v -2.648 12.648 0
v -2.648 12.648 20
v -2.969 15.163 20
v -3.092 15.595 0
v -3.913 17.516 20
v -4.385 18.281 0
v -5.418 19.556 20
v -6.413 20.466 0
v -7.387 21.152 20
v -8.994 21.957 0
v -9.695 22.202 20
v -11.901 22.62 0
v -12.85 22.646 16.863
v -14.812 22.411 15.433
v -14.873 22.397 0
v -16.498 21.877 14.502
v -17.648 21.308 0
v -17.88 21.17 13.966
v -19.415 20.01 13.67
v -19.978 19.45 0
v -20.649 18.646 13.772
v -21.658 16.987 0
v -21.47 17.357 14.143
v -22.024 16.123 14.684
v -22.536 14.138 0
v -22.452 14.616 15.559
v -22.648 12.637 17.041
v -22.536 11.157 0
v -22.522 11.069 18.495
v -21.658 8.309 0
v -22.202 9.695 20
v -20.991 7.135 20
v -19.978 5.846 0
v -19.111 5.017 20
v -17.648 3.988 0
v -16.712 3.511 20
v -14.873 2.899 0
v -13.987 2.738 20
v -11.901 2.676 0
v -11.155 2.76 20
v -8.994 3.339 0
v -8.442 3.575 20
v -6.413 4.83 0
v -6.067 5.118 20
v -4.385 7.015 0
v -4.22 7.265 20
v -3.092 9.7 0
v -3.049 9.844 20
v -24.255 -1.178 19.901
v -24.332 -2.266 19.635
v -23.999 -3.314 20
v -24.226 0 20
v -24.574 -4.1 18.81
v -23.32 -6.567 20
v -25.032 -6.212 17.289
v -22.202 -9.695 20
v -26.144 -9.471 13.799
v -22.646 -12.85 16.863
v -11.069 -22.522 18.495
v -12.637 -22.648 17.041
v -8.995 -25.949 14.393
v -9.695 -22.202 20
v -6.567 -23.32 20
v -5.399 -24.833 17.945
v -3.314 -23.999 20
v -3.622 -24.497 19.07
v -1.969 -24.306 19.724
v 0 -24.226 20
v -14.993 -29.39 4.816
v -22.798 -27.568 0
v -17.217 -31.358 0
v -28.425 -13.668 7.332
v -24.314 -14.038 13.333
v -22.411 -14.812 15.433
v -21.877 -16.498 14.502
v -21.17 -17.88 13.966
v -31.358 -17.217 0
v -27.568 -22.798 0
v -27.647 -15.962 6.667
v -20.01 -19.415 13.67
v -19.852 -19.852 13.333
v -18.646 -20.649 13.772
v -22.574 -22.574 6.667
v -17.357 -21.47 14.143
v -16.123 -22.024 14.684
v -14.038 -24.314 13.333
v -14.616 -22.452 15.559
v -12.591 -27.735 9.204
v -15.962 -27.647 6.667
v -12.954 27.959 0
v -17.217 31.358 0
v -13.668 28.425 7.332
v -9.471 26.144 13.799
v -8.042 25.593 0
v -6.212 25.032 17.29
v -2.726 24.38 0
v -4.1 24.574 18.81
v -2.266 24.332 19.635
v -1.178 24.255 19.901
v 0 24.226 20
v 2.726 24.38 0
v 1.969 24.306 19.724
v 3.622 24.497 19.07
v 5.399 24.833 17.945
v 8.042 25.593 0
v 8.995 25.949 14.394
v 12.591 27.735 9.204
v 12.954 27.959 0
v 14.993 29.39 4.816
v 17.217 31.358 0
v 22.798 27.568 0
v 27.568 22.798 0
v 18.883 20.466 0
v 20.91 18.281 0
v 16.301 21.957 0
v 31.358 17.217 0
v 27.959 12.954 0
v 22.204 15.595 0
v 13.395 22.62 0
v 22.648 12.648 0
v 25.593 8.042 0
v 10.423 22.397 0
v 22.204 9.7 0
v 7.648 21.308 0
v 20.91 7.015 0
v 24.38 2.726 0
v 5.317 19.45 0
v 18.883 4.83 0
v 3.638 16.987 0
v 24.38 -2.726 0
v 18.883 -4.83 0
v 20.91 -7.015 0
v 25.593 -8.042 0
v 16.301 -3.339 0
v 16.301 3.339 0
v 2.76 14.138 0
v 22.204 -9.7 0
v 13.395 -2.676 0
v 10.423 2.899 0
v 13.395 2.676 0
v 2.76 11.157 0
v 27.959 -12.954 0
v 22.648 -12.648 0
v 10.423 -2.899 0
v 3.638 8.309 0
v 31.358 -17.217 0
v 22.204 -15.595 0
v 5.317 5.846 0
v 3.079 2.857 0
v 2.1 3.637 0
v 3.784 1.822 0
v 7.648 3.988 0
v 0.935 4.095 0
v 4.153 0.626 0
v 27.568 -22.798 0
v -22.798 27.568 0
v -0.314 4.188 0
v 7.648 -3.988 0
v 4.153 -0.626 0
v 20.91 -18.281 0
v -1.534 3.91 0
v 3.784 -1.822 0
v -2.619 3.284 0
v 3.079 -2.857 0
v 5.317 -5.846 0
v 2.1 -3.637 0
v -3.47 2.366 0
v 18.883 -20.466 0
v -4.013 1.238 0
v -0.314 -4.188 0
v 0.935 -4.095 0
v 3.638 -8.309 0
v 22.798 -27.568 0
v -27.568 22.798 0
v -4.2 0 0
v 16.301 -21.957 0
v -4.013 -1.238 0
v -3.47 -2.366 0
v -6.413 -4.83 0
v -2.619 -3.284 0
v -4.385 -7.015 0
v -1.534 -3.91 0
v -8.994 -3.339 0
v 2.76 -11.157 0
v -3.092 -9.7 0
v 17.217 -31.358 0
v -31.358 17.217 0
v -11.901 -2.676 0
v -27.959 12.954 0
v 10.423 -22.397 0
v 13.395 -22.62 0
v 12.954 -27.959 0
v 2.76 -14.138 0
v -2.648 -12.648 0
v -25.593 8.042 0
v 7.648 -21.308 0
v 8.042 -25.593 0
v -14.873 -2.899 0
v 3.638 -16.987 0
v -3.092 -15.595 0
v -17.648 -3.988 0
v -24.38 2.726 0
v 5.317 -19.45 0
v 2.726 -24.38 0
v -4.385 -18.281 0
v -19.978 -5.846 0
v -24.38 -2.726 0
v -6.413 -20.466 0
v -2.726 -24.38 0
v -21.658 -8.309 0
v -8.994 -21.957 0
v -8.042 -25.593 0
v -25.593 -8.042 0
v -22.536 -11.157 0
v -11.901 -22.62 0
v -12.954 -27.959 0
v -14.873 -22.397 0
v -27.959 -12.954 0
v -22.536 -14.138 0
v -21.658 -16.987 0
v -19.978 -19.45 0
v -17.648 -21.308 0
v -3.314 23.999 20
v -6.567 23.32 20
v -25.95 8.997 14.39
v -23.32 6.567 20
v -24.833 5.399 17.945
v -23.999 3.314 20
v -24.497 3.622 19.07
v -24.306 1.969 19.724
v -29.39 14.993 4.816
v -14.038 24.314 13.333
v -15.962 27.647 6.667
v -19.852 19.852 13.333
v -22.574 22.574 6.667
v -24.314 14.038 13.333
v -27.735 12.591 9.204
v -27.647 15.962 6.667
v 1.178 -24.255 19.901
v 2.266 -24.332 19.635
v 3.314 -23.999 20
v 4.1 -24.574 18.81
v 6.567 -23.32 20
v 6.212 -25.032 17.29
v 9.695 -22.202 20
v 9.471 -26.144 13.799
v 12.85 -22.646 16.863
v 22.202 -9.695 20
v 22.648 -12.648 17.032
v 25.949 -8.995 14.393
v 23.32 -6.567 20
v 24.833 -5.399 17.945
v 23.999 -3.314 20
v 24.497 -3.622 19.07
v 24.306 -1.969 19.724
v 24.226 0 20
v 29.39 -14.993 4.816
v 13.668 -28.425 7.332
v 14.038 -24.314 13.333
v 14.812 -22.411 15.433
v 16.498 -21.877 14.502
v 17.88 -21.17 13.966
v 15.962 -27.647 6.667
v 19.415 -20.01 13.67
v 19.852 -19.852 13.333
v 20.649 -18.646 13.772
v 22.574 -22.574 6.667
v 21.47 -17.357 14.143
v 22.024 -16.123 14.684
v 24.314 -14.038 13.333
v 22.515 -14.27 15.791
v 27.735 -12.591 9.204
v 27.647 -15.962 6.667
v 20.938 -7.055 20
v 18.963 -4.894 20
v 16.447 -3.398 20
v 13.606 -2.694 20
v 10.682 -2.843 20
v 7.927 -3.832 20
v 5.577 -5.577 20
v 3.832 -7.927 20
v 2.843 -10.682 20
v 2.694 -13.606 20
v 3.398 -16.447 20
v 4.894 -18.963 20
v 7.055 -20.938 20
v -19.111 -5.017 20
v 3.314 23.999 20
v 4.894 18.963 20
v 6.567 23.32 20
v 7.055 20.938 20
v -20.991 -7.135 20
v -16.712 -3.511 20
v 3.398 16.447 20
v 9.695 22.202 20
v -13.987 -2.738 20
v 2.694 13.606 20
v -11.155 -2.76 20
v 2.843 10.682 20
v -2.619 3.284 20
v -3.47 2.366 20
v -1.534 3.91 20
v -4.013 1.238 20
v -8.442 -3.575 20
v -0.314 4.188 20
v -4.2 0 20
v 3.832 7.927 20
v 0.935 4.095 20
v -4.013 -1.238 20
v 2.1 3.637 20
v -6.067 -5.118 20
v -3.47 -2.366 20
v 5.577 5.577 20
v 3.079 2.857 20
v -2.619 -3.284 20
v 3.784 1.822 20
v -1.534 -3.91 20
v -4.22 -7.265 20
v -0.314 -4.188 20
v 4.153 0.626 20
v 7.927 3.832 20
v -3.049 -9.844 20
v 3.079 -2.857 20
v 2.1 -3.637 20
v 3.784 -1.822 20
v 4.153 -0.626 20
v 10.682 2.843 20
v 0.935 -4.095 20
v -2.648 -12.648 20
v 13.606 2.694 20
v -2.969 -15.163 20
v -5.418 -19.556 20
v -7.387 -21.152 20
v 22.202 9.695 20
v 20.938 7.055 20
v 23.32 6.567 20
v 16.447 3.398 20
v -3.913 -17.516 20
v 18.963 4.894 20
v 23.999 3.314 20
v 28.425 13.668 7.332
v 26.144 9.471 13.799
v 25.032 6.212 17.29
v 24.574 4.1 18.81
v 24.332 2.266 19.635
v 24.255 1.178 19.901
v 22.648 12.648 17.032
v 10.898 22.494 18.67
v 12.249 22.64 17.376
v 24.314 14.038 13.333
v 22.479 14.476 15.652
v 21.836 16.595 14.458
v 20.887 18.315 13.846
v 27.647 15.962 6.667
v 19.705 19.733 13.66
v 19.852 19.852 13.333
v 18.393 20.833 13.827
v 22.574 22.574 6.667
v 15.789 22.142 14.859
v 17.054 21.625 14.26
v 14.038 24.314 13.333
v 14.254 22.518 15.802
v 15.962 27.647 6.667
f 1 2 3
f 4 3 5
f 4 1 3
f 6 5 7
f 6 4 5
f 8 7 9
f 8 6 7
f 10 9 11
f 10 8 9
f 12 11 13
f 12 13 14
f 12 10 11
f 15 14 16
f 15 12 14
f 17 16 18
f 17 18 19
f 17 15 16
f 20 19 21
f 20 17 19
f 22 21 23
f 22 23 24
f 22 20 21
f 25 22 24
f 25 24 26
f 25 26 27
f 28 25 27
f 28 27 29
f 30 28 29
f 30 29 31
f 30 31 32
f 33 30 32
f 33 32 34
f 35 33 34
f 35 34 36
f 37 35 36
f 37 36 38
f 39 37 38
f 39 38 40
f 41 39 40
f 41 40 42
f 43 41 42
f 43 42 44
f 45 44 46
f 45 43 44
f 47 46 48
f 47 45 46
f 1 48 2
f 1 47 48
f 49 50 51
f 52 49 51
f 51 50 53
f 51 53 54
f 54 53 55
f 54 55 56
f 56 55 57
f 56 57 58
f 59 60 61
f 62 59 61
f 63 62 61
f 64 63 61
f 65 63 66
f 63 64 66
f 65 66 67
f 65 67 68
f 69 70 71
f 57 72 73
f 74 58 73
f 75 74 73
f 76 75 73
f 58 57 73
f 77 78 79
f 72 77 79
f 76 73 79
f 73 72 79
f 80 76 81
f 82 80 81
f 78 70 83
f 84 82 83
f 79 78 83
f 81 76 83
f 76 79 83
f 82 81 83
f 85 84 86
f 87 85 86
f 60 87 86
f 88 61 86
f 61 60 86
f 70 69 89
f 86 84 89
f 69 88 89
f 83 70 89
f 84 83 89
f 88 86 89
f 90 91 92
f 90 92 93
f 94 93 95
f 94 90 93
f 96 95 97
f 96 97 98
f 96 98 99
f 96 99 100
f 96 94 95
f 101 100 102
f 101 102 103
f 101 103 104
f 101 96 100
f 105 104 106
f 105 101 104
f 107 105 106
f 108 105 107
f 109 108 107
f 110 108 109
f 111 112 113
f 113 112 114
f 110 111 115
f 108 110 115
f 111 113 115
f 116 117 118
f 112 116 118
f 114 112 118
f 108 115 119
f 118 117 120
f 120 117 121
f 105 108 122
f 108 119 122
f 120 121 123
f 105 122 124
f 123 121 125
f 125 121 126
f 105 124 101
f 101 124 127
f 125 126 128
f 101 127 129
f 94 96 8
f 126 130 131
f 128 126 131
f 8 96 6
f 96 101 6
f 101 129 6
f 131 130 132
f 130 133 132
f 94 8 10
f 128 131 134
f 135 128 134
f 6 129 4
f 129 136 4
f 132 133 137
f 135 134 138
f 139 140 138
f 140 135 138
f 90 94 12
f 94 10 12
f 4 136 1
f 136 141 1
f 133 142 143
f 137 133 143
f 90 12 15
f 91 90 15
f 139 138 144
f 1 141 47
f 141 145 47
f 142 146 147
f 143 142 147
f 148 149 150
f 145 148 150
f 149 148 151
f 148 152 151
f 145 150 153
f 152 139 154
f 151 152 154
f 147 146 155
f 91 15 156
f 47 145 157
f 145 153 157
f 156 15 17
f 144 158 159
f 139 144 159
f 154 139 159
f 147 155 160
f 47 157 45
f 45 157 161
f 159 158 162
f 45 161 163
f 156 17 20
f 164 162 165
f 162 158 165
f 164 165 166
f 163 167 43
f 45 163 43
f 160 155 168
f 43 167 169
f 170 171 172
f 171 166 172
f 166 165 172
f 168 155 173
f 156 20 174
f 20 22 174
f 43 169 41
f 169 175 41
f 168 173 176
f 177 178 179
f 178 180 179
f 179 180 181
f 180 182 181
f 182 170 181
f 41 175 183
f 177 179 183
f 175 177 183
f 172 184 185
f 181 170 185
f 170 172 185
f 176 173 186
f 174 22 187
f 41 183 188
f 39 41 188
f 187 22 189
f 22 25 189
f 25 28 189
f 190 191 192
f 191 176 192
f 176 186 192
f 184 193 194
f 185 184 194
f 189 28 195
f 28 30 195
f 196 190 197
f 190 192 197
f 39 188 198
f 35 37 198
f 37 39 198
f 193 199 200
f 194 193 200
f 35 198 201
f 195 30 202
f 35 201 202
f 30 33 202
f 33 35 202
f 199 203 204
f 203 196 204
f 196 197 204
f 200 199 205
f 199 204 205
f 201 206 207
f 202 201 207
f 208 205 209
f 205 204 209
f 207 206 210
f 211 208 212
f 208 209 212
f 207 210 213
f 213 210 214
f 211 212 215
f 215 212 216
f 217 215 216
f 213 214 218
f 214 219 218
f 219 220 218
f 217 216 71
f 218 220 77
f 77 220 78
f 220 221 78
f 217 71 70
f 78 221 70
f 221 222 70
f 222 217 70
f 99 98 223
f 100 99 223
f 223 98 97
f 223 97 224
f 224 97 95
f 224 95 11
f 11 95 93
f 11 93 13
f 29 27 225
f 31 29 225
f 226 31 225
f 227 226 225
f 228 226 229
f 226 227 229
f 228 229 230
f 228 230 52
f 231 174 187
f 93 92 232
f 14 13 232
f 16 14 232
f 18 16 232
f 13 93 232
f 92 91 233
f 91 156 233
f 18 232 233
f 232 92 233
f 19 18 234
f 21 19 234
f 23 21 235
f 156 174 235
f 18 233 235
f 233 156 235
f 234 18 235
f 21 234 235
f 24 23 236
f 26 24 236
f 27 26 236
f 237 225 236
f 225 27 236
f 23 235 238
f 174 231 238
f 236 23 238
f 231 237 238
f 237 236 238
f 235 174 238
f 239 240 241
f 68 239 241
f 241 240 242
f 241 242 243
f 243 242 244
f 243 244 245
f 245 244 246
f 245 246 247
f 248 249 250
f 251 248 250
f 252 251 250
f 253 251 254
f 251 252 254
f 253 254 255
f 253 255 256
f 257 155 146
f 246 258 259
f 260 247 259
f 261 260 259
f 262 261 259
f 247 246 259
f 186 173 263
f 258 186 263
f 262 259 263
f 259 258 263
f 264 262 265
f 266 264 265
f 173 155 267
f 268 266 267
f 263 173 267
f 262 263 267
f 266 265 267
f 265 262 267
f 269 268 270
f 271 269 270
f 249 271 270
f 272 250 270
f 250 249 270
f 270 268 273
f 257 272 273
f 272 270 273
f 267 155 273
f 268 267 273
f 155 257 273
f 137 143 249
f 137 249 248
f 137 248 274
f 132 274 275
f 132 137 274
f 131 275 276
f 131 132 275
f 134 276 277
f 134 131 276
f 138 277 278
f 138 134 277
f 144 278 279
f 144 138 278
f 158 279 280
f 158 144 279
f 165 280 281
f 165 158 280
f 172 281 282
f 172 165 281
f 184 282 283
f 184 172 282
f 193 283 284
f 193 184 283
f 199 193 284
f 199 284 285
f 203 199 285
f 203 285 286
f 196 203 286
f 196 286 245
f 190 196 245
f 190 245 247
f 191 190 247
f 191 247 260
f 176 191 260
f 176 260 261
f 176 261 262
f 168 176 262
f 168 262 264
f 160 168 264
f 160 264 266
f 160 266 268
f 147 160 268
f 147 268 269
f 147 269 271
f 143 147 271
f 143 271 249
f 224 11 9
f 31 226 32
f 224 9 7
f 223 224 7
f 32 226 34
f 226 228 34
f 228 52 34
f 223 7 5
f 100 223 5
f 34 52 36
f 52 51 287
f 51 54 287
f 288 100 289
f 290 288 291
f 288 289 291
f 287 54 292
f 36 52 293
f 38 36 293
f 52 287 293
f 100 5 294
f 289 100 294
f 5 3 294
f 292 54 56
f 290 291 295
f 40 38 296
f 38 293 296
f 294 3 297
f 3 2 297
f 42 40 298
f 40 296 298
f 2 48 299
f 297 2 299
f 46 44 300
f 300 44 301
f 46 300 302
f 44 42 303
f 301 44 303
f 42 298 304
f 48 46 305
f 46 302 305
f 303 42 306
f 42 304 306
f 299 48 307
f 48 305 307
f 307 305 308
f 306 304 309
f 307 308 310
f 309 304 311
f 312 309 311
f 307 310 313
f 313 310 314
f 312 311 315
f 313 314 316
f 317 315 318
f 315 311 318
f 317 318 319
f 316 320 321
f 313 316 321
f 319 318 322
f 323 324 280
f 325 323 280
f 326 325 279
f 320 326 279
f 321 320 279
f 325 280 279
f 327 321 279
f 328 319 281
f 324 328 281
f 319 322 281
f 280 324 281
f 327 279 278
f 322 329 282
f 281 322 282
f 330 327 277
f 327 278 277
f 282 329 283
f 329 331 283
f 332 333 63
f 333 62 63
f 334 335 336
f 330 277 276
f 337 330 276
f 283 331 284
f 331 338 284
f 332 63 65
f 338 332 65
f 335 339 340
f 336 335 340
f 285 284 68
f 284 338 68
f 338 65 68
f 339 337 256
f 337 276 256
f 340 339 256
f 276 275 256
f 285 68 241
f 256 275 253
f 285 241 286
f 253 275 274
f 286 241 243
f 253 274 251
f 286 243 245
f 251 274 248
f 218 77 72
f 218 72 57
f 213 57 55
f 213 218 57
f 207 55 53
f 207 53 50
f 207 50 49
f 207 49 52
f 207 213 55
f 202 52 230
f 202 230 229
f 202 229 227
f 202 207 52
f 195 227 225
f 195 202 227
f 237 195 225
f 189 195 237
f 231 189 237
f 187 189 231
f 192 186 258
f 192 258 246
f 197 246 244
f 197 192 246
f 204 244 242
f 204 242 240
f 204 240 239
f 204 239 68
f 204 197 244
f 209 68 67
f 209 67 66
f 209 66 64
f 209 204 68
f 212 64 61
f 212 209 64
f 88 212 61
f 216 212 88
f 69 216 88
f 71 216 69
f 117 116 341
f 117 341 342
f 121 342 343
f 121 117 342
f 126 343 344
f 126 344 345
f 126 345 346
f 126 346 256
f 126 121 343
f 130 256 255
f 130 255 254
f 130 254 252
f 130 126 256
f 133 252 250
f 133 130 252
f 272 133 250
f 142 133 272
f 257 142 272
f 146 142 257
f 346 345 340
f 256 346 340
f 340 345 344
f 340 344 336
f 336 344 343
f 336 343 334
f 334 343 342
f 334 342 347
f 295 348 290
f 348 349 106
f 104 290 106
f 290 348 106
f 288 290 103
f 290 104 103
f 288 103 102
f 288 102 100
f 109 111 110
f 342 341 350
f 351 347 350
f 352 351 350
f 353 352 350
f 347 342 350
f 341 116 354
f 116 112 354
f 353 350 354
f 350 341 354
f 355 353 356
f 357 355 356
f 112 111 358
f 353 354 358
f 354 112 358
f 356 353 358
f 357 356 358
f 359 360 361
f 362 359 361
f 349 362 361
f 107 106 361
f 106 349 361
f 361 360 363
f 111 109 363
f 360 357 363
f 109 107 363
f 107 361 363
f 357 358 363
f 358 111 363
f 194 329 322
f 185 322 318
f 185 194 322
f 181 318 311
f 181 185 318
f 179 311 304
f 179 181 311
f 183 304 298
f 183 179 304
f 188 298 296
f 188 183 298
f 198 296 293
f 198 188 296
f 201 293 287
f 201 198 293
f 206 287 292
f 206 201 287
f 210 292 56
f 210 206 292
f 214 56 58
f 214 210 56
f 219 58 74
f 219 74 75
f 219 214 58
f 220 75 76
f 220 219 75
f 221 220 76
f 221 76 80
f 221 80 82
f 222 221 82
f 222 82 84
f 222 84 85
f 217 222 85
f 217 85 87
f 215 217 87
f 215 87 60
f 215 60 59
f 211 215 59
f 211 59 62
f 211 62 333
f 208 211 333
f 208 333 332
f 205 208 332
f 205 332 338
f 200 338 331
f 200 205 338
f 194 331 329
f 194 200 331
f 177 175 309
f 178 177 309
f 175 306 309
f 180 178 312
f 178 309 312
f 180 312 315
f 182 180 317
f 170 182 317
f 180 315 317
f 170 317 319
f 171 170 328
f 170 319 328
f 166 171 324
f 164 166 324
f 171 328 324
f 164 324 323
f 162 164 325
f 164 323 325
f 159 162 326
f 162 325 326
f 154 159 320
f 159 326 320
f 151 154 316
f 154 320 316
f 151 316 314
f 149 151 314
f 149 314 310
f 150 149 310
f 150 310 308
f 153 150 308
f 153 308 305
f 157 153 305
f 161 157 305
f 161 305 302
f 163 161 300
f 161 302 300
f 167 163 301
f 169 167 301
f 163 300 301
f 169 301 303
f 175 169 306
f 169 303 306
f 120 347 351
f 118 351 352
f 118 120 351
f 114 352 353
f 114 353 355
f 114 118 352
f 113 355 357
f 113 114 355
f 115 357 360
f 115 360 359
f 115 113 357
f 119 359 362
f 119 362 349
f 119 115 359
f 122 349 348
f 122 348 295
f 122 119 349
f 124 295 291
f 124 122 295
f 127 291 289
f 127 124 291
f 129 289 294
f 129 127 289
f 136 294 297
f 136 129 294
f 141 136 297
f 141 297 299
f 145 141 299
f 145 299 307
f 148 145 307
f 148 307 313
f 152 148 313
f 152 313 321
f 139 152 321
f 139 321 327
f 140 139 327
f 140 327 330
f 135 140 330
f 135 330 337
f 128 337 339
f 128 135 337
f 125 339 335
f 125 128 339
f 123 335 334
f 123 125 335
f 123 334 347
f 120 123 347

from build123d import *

# Parameters (mm, degrees)
F3_DEPTH = 20.001
F4_R     = 10
F5_DEPTH = 20.0010001


with BuildPart() as f1:
    # F0 (on Front) → F1 (revolve)
    with BuildSketch(Plane.XZ):
        Polygon((-4.2, 0), (-4.2, 20), (-24.2264973081, 20), (-35.7735026919, 0), align=None)
    revolve(axis=Axis((0, 0, 10), (0, 0, 1)))

    # F2 (on Top) → F3 (cut, through all)
    with BuildSketch(Plane.XY):
        with BuildLine():
            ThreePointArc((-17.2168920075, 31.3579674795), (0, 24.2264973081), (17.2168920075, 31.3579674795))
            ThreePointArc((17.2168920075, 31.3579674795), (0, 35.7735026919), (-17.2168920075, 31.3579674795))
        make_face()
        with BuildLine():
            ThreePointArc((31.3579674795, -17.2168920075), (34.6520405524, -8.887045651), (35.7735026919, 0))
            ThreePointArc((35.7735026919, 0), (34.6520405524, 8.887045651), (31.3579674795, 17.2168920075))
            ThreePointArc((31.3579674795, 17.2168920075), (24.2264973081, 0), (31.3579674795, -17.2168920075))
        make_face()
        with BuildLine():
            ThreePointArc((-17.2168920075, -31.3579674795), (0, -35.7735026919), (17.2168920075, -31.3579674795))
            ThreePointArc((17.2168920075, -31.3579674795), (0, -24.2264973081), (-17.2168920075, -31.3579674795))
        make_face()
        with BuildLine():
            ThreePointArc((-31.3579674795, -17.2168920075), (-24.2264973081, 0), (-31.3579674795, 17.2168920075))
            ThreePointArc((-31.3579674795, 17.2168920075), (-35.7735026919, 0), (-31.3579674795, -17.2168920075))
        make_face()
    extrude(amount=F3_DEPTH, mode=Mode.SUBTRACT)

    # F4 (on Top) → F5 (cut, through all)
    with BuildSketch(Plane.XY):
        with Locations((-12.6478431701, -12.6478431701)):
            Circle(F4_R)
        with Locations((12.6478431701, -12.6478431701)):
            Circle(F4_R)
        with Locations((12.6478431701, 12.6478431701)):
            Circle(F4_R)
        with Locations((-12.6478431701, 12.6478431701)):
            Circle(F4_R)
    extrude(amount=F5_DEPTH, mode=Mode.SUBTRACT)


solid = f1.part
